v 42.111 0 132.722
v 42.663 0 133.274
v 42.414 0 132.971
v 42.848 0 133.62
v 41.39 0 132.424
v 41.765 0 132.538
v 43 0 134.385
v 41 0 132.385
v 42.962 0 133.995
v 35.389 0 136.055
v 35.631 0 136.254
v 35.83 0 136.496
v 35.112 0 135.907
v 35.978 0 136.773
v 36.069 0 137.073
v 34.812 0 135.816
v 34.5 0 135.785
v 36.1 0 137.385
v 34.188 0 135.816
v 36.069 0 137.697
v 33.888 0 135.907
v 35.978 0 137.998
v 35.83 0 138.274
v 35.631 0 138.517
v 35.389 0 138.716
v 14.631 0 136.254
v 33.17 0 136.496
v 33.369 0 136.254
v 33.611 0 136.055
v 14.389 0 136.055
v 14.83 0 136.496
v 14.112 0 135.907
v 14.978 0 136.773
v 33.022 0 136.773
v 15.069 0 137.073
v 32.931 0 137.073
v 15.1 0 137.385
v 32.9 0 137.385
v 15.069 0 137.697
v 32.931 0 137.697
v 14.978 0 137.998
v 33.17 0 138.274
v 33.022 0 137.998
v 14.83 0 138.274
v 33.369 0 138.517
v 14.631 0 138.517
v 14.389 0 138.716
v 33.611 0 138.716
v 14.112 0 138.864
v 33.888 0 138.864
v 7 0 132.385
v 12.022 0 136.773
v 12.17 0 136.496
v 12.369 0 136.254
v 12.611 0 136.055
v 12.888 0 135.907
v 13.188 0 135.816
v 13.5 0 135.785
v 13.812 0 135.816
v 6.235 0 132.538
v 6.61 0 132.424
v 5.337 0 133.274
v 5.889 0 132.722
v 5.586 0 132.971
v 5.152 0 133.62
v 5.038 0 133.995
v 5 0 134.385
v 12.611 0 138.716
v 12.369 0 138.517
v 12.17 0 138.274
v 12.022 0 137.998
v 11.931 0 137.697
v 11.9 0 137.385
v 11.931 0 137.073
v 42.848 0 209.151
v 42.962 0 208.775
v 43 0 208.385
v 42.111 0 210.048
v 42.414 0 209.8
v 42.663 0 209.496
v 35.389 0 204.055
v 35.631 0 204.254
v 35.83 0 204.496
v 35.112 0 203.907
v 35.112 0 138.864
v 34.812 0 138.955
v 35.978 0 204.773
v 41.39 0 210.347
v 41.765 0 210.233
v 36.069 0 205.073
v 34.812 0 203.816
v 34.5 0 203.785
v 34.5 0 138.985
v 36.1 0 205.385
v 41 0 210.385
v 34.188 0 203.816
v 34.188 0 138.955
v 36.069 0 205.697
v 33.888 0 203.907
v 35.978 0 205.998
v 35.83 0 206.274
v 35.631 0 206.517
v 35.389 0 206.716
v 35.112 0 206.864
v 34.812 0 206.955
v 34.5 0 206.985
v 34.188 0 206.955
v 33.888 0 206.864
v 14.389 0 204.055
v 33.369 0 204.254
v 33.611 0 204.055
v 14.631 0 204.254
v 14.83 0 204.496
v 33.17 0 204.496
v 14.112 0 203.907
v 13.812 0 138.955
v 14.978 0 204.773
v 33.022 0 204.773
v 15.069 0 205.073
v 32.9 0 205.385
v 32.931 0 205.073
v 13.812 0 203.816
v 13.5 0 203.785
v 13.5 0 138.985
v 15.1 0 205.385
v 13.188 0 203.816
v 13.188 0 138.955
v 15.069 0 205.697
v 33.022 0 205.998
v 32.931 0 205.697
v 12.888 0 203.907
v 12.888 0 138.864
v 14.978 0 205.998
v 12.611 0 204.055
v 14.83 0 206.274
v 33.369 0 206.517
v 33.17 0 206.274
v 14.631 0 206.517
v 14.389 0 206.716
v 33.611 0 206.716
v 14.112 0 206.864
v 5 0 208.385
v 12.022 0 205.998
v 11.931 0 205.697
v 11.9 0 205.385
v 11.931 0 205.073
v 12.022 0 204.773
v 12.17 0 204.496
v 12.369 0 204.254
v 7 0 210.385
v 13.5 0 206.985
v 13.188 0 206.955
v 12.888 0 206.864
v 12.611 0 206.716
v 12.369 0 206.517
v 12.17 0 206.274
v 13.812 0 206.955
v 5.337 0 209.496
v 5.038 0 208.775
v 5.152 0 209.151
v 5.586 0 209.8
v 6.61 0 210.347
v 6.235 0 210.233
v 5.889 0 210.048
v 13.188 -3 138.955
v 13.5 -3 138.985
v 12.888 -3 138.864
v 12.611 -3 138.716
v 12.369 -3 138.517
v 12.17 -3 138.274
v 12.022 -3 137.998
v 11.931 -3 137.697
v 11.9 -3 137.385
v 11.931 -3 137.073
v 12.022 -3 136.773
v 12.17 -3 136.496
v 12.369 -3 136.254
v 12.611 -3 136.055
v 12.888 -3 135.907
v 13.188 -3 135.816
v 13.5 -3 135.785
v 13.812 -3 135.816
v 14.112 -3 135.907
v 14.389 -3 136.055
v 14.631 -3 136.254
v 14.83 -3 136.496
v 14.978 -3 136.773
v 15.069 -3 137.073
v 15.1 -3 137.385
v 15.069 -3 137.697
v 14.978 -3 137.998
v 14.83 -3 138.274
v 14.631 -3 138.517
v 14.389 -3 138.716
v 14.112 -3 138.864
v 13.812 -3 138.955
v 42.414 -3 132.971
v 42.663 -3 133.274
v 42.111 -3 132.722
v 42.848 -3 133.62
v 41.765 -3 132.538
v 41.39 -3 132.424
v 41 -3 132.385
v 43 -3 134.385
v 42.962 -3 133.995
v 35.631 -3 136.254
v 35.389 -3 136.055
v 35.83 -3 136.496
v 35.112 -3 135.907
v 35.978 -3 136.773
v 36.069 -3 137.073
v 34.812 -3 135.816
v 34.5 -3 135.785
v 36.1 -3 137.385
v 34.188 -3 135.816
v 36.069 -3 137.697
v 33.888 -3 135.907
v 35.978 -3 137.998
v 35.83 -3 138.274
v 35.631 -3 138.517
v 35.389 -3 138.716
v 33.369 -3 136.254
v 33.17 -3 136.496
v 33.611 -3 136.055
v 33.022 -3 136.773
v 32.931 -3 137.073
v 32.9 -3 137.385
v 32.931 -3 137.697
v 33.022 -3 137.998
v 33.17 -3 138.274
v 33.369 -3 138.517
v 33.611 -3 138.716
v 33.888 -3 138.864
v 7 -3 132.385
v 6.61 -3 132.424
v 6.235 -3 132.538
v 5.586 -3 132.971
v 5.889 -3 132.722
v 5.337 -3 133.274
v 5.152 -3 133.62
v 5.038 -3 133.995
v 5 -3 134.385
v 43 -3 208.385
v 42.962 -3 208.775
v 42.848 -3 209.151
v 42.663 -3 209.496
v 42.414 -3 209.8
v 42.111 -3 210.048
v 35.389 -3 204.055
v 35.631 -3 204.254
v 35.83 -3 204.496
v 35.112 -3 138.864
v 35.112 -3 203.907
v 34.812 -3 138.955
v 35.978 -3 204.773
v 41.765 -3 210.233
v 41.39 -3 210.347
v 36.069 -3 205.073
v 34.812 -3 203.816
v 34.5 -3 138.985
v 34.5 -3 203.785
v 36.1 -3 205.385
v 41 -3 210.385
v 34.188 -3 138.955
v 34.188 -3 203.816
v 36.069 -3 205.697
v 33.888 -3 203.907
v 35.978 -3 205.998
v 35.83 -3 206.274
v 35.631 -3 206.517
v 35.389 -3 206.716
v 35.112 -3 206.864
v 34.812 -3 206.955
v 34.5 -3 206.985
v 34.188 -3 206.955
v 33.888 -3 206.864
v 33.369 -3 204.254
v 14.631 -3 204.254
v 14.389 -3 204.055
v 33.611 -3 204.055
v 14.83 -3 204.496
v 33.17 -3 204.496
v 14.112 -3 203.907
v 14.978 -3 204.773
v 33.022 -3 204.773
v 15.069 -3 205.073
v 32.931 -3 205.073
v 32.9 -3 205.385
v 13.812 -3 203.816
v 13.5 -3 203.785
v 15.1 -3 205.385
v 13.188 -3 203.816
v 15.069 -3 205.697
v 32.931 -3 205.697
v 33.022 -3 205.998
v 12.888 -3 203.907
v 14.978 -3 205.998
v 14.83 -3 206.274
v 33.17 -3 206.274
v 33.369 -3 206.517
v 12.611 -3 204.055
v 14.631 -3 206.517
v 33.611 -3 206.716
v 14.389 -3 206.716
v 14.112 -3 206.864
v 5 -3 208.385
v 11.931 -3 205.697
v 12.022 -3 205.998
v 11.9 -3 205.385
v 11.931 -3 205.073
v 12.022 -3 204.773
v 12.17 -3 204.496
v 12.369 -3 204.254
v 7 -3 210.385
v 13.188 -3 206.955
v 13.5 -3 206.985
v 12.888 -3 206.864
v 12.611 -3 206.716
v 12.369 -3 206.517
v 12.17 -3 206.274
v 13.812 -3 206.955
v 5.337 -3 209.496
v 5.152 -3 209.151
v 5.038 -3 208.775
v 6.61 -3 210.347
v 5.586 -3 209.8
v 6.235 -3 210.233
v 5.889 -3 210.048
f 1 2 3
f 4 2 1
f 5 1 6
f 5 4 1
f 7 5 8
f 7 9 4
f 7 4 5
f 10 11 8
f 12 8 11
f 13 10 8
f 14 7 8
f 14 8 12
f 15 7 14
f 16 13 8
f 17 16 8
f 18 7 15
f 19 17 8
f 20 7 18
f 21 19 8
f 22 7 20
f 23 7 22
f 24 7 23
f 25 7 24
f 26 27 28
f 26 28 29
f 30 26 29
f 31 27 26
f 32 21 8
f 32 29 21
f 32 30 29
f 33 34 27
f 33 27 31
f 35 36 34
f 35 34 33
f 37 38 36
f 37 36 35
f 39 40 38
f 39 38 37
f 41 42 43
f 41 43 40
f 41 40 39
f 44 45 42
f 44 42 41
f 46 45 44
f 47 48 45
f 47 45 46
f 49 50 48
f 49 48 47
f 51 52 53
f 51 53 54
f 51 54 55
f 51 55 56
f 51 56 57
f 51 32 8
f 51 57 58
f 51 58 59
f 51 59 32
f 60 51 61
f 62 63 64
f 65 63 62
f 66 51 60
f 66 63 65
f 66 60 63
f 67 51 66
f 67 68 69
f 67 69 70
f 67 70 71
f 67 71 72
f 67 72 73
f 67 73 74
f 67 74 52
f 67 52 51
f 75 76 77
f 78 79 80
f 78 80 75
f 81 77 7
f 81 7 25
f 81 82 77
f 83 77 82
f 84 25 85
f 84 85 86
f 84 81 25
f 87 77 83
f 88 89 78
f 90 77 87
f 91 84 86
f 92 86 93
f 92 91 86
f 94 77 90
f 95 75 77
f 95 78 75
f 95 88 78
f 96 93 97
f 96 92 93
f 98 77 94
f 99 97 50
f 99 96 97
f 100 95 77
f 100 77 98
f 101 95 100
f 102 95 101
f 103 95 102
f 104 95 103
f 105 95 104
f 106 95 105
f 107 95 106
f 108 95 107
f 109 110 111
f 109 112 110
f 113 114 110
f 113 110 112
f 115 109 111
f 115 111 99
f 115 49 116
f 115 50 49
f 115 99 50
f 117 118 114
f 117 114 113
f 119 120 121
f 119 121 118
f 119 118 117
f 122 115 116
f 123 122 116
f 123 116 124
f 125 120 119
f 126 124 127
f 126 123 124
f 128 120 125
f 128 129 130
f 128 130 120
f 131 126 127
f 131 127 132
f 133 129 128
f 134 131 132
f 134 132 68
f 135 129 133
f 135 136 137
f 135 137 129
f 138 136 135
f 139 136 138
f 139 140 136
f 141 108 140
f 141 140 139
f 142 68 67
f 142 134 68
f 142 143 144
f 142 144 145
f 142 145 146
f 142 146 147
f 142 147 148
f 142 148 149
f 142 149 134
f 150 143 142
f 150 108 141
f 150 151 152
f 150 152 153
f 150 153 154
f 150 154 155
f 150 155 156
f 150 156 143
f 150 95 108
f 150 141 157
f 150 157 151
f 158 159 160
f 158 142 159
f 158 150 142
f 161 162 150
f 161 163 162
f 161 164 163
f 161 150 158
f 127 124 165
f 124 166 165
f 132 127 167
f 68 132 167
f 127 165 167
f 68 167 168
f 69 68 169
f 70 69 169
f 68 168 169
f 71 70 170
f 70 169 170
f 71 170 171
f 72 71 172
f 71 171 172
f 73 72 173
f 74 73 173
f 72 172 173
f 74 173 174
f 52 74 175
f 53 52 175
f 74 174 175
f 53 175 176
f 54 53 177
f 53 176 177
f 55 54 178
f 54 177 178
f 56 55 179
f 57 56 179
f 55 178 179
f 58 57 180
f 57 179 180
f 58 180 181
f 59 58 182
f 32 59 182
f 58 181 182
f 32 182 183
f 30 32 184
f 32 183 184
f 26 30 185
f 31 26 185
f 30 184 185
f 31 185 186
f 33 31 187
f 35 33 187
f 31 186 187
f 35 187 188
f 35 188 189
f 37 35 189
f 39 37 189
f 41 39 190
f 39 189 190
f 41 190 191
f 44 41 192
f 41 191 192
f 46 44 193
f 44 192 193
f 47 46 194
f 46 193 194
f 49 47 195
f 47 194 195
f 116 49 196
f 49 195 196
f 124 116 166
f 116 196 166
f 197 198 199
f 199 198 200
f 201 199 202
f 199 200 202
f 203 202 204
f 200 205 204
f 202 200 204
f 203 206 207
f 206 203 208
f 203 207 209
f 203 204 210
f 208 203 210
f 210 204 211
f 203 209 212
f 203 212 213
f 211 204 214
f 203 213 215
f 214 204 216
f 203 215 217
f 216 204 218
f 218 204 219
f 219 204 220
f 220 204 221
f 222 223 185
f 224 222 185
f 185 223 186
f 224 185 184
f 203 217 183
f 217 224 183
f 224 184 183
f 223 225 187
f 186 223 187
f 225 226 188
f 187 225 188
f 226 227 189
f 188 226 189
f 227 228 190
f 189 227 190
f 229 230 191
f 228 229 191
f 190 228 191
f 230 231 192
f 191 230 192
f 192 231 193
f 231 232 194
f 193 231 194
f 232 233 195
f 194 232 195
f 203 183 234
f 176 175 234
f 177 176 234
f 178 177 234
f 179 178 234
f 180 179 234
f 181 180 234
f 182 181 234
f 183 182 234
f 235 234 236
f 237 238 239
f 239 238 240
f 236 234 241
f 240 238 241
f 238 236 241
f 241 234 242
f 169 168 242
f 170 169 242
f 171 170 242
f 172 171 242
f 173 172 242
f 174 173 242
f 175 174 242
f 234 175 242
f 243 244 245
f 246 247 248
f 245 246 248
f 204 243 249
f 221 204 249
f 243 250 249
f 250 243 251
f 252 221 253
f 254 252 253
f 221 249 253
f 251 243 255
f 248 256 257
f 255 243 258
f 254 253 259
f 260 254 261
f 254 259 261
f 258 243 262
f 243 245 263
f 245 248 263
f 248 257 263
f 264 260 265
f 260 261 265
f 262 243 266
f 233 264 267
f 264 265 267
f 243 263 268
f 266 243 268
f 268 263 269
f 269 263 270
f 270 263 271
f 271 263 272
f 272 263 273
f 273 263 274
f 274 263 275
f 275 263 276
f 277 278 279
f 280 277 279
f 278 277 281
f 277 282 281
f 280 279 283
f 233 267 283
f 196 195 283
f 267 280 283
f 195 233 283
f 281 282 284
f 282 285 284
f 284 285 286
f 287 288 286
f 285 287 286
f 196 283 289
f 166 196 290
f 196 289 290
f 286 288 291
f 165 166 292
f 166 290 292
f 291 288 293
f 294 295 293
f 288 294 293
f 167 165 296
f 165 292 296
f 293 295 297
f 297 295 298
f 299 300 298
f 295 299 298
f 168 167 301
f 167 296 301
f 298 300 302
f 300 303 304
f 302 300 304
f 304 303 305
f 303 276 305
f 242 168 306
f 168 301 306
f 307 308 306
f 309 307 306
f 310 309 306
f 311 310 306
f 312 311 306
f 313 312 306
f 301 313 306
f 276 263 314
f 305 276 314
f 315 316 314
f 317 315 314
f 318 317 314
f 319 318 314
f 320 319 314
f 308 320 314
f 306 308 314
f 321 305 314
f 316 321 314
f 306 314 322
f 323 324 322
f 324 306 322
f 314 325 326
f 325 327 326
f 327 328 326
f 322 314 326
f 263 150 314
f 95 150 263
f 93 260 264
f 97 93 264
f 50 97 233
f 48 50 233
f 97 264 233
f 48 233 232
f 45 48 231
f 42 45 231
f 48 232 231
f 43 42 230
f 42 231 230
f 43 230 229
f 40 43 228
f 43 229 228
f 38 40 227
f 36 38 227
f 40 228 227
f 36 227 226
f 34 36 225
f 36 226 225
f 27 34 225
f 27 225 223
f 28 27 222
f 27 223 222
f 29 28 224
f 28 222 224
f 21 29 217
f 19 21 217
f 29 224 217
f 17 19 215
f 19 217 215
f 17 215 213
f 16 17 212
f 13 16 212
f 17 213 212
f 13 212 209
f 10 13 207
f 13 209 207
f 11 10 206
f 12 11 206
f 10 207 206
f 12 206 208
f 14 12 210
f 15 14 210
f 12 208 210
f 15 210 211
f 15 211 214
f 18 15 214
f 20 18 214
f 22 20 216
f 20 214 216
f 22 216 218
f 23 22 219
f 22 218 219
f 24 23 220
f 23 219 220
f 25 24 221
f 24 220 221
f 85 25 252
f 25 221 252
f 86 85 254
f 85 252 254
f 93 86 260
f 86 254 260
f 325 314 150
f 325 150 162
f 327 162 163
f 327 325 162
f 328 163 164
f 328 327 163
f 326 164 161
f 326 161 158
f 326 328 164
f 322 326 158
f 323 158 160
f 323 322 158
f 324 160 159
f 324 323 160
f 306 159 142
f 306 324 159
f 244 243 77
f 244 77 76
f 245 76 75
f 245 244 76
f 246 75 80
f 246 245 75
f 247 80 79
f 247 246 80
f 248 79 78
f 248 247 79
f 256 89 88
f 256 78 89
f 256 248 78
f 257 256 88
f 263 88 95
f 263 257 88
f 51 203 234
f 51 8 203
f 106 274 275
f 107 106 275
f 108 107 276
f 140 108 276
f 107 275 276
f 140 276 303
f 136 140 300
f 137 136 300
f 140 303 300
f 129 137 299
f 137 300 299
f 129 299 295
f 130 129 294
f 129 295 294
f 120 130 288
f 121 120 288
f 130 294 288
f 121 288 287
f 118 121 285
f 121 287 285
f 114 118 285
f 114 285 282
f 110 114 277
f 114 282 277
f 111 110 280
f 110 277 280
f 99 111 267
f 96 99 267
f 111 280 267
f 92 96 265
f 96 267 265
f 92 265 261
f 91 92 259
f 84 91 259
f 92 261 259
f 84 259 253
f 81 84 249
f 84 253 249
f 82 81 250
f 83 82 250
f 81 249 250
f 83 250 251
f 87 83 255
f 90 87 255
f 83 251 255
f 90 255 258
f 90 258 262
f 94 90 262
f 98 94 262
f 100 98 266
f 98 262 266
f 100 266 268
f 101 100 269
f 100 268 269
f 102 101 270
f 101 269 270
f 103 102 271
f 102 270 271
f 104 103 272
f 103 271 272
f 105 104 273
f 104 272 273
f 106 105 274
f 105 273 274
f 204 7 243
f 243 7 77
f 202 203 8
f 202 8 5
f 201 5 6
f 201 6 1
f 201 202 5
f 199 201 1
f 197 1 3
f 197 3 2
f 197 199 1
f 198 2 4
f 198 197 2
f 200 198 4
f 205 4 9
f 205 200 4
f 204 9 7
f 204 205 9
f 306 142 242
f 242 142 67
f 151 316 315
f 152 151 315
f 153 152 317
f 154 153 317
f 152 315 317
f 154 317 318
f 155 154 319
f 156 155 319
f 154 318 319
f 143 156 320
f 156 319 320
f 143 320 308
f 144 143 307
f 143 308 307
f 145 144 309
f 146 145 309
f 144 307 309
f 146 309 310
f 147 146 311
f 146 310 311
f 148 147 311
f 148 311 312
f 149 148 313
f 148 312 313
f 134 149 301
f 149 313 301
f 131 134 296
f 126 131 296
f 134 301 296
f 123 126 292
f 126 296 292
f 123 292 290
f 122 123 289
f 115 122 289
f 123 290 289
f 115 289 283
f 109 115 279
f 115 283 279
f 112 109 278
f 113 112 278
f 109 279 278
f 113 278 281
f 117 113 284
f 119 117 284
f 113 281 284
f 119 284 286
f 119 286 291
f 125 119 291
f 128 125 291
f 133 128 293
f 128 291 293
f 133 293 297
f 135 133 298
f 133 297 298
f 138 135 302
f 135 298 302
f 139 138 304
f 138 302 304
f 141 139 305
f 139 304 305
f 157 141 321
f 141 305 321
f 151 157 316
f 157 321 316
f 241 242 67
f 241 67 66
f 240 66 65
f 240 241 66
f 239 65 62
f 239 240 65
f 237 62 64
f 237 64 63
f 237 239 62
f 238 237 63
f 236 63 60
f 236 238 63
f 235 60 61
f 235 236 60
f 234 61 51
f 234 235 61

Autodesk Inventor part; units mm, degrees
ref_plane "YZ Plane" through (0, 0, 0) normal (1, 0, 0) x (0, 1, 0)
ref_plane "XZ Plane" through (0, 0, 0) normal (0, 1, 0) x (-1, 0, 0)
ref_plane "XY Plane" through (0, 0, 0) normal (0, 0, 1) x (1, 0, 0)
sketch "Sketch1" plane through (0, 0, 0) normal (0, 1, 0) x (-1, 0, 0)
  line L0 (-43.5, 202.3853) -> (-0.5, 202.3853) construction
  line L1 (-0.5, 202.3853) -> (-0.5, 140.3853) construction
  line L2 (-0.5, 140.3853) -> (-43.5, 140.3853) construction
  line L3 (-43.5, 140.3853) -> (-43.5, 202.3853) construction
  line L4 (0, 112) -> (0, 260) construction
  line L5 (2.5, 205.3853) -> (-46.5, 205.3853) construction
  line L6 (-46.5, 205.3853) -> (-46.5, 137.3853) construction
  line L7 (-46.5, 137.3853) -> (2.5, 137.3853) construction
  line L8 (2.5, 137.3853) -> (2.5, 205.3853) construction
  line L9 (21.9355, 171.3853) -> (-82.4794, 171.3853) construction
  line L10 (-22, 245.5328) -> (-22, 103.5673) construction
  line L11 (-51.5, 132.3853) -> (7.5, 132.3853)
  line L12 (7.5, 132.3853) -> (7.5, 210.3853)
  line L13 (7.5, 210.3853) -> (-51.5, 210.3853)
  line L14 (-51.5, 210.3853) -> (-51.5, 132.3853)
  line L15 (-51.5, 132.3853) -> (7.5, 210.3853) construction
  line L16 (7.5, 132.3853) -> (-51.5, 210.3853) construction
  point P0 (0, 0)
  point P1 (0, 0)
  point P2 (-13.5, 205.3853)
  point P3 (-34.5, 205.3853)
  point P4 (-46.5, 183.3853)
  point P5 (-46.5, 159.3853)
  point P6 (-34.5, 137.3853)
  point P7 (-13.5, 137.3853)
  point P8 (2.5, 171.3853)
  point P9 (-22, 137.3853)
  point P10 (-22, 171.3853)
  point P11 (0, 132.3853)
  point P12 (0, 210.3853)
  point P13 (-13.5, 205.3853)
  point P14 (-34.5, 205.3853)
  point P15 (-46.5, 183.3853)
  point P16 (-46.5, 159.3853)
  point P17 (-34.5, 137.3853)
  point P18 (-13.5, 137.3853)
  point P19 (2.5, 183.3853)
  point P20 (2.5, 159.3853)
  dimension "d0" = 43
  dimension "d1" = 62
  dimension "d2" = 0.5
  dimension "d3" = 3
  dimension "d4" = 12
  dimension "d5" = 21
  dimension "d6" = 21
  dimension "d7" = 12
  dimension "d8" = 22
  dimension "d9" = 22
  dimension "d10" = 5
  dimension "d11" = 5
  dimension "d28" = 22
  dimension "d29" = 22
extrude "Extrusion1" add sketch "Sketch1" against normal blind 3
hole "Hole1" at (34.5, 0, 137.3853) at (13.5, 0, 137.3853) at (46.5, 0, 159.3853) at (46.5, 0, 183.3853) at (34.5, 0, 205.3853) at (-2.5, 0, 159.3853) at (-2.5, 0, 183.3853) at (13.5, 0, 205.3853) direction (0, -1, 0) diameter 3.2 end through all
fillet "Fillet1" radius 2 4 edges at (-7.5, -1.5, 210.3853) (51.5, -1.5, 210.3853) (51.5, -1.5, 132.3853) (-7.5, -1.5, 132.3853)
sketch "Sketch2" plane through (0, 0, 0) normal (0, 1, 0) x (1, 0, 0)
  line L0 (49.5, -132.3853) -> (-5.5, -132.3853) projected
  line L1 (-5.5, -210.3853) -> (49.5, -210.3853) projected
  line L2 (5, -132.3853) -> (43, -132.3853)
  line L3 (43, -132.3853) -> (43, -210.3853)
  line L4 (43, -210.3853) -> (5, -210.3853)
  line L5 (5, -210.3853) -> (5, -132.3853)
  arc A0 (-5.5, -132.3853) -> (-7.5, -134.3853) centre (-5.5, -134.3853) ccw projected
  line L6 (-7.5, -134.3853) -> (-7.5, -208.3853) projected
  arc A1 (-7.5, -208.3853) -> (-5.5, -210.3853) centre (-5.5, -208.3853) ccw projected
  line L7 (-5.5, -210.3853) -> (49.5, -210.3853) projected
  arc A2 (49.5, -210.3853) -> (51.5, -208.3853) centre (49.5, -208.3853) ccw projected
  line L8 (51.5, -208.3853) -> (51.5, -134.3853) projected
  arc A3 (51.5, -134.3853) -> (49.5, -132.3853) centre (49.5, -134.3853) ccw projected
  line L9 (49.5, -132.3853) -> (-5.5, -132.3853) projected
  circle A4 centre (-2.5, -183.3853) radius 1.6 projected
  circle A5 centre (34.5, -205.3853) radius 1.6 projected
  circle A6 centre (46.5, -159.3853) radius 1.6 projected
  circle A7 centre (34.5, -137.3853) radius 1.6 projected
  circle A8 centre (13.5, -137.3853) radius 1.6 projected
  circle A9 centre (46.5, -183.3853) radius 1.6 projected
  circle A10 centre (-2.5, -159.3853) radius 1.6 projected
  circle A11 centre (13.5, -205.3853) radius 1.6 projected
  line L10 (24, -128.4136) -> (24, -225.5788) construction
  point P0 (0, 0)
  point P1 (24, -132.3853)
  dimension "d31" = 38
  dimension "d32" = 10.5
  dimension "d34" = 21
extrude "Extrusion2" cut sketch "Sketch2" against normal through all contours A3 L8 A2 L1 L3 L0 | L5 L1 A1 L6 A0 L0
fillet "Fillet2" radius 2 4 edges at (5, -1.5, 210.3853) (43, -1.5, 210.3853) (43, -1.5, 132.3853) (5, -1.5, 132.3853)
equation "\"d32\" = 0.5 * d34"
properties part number "LiPo cover"
